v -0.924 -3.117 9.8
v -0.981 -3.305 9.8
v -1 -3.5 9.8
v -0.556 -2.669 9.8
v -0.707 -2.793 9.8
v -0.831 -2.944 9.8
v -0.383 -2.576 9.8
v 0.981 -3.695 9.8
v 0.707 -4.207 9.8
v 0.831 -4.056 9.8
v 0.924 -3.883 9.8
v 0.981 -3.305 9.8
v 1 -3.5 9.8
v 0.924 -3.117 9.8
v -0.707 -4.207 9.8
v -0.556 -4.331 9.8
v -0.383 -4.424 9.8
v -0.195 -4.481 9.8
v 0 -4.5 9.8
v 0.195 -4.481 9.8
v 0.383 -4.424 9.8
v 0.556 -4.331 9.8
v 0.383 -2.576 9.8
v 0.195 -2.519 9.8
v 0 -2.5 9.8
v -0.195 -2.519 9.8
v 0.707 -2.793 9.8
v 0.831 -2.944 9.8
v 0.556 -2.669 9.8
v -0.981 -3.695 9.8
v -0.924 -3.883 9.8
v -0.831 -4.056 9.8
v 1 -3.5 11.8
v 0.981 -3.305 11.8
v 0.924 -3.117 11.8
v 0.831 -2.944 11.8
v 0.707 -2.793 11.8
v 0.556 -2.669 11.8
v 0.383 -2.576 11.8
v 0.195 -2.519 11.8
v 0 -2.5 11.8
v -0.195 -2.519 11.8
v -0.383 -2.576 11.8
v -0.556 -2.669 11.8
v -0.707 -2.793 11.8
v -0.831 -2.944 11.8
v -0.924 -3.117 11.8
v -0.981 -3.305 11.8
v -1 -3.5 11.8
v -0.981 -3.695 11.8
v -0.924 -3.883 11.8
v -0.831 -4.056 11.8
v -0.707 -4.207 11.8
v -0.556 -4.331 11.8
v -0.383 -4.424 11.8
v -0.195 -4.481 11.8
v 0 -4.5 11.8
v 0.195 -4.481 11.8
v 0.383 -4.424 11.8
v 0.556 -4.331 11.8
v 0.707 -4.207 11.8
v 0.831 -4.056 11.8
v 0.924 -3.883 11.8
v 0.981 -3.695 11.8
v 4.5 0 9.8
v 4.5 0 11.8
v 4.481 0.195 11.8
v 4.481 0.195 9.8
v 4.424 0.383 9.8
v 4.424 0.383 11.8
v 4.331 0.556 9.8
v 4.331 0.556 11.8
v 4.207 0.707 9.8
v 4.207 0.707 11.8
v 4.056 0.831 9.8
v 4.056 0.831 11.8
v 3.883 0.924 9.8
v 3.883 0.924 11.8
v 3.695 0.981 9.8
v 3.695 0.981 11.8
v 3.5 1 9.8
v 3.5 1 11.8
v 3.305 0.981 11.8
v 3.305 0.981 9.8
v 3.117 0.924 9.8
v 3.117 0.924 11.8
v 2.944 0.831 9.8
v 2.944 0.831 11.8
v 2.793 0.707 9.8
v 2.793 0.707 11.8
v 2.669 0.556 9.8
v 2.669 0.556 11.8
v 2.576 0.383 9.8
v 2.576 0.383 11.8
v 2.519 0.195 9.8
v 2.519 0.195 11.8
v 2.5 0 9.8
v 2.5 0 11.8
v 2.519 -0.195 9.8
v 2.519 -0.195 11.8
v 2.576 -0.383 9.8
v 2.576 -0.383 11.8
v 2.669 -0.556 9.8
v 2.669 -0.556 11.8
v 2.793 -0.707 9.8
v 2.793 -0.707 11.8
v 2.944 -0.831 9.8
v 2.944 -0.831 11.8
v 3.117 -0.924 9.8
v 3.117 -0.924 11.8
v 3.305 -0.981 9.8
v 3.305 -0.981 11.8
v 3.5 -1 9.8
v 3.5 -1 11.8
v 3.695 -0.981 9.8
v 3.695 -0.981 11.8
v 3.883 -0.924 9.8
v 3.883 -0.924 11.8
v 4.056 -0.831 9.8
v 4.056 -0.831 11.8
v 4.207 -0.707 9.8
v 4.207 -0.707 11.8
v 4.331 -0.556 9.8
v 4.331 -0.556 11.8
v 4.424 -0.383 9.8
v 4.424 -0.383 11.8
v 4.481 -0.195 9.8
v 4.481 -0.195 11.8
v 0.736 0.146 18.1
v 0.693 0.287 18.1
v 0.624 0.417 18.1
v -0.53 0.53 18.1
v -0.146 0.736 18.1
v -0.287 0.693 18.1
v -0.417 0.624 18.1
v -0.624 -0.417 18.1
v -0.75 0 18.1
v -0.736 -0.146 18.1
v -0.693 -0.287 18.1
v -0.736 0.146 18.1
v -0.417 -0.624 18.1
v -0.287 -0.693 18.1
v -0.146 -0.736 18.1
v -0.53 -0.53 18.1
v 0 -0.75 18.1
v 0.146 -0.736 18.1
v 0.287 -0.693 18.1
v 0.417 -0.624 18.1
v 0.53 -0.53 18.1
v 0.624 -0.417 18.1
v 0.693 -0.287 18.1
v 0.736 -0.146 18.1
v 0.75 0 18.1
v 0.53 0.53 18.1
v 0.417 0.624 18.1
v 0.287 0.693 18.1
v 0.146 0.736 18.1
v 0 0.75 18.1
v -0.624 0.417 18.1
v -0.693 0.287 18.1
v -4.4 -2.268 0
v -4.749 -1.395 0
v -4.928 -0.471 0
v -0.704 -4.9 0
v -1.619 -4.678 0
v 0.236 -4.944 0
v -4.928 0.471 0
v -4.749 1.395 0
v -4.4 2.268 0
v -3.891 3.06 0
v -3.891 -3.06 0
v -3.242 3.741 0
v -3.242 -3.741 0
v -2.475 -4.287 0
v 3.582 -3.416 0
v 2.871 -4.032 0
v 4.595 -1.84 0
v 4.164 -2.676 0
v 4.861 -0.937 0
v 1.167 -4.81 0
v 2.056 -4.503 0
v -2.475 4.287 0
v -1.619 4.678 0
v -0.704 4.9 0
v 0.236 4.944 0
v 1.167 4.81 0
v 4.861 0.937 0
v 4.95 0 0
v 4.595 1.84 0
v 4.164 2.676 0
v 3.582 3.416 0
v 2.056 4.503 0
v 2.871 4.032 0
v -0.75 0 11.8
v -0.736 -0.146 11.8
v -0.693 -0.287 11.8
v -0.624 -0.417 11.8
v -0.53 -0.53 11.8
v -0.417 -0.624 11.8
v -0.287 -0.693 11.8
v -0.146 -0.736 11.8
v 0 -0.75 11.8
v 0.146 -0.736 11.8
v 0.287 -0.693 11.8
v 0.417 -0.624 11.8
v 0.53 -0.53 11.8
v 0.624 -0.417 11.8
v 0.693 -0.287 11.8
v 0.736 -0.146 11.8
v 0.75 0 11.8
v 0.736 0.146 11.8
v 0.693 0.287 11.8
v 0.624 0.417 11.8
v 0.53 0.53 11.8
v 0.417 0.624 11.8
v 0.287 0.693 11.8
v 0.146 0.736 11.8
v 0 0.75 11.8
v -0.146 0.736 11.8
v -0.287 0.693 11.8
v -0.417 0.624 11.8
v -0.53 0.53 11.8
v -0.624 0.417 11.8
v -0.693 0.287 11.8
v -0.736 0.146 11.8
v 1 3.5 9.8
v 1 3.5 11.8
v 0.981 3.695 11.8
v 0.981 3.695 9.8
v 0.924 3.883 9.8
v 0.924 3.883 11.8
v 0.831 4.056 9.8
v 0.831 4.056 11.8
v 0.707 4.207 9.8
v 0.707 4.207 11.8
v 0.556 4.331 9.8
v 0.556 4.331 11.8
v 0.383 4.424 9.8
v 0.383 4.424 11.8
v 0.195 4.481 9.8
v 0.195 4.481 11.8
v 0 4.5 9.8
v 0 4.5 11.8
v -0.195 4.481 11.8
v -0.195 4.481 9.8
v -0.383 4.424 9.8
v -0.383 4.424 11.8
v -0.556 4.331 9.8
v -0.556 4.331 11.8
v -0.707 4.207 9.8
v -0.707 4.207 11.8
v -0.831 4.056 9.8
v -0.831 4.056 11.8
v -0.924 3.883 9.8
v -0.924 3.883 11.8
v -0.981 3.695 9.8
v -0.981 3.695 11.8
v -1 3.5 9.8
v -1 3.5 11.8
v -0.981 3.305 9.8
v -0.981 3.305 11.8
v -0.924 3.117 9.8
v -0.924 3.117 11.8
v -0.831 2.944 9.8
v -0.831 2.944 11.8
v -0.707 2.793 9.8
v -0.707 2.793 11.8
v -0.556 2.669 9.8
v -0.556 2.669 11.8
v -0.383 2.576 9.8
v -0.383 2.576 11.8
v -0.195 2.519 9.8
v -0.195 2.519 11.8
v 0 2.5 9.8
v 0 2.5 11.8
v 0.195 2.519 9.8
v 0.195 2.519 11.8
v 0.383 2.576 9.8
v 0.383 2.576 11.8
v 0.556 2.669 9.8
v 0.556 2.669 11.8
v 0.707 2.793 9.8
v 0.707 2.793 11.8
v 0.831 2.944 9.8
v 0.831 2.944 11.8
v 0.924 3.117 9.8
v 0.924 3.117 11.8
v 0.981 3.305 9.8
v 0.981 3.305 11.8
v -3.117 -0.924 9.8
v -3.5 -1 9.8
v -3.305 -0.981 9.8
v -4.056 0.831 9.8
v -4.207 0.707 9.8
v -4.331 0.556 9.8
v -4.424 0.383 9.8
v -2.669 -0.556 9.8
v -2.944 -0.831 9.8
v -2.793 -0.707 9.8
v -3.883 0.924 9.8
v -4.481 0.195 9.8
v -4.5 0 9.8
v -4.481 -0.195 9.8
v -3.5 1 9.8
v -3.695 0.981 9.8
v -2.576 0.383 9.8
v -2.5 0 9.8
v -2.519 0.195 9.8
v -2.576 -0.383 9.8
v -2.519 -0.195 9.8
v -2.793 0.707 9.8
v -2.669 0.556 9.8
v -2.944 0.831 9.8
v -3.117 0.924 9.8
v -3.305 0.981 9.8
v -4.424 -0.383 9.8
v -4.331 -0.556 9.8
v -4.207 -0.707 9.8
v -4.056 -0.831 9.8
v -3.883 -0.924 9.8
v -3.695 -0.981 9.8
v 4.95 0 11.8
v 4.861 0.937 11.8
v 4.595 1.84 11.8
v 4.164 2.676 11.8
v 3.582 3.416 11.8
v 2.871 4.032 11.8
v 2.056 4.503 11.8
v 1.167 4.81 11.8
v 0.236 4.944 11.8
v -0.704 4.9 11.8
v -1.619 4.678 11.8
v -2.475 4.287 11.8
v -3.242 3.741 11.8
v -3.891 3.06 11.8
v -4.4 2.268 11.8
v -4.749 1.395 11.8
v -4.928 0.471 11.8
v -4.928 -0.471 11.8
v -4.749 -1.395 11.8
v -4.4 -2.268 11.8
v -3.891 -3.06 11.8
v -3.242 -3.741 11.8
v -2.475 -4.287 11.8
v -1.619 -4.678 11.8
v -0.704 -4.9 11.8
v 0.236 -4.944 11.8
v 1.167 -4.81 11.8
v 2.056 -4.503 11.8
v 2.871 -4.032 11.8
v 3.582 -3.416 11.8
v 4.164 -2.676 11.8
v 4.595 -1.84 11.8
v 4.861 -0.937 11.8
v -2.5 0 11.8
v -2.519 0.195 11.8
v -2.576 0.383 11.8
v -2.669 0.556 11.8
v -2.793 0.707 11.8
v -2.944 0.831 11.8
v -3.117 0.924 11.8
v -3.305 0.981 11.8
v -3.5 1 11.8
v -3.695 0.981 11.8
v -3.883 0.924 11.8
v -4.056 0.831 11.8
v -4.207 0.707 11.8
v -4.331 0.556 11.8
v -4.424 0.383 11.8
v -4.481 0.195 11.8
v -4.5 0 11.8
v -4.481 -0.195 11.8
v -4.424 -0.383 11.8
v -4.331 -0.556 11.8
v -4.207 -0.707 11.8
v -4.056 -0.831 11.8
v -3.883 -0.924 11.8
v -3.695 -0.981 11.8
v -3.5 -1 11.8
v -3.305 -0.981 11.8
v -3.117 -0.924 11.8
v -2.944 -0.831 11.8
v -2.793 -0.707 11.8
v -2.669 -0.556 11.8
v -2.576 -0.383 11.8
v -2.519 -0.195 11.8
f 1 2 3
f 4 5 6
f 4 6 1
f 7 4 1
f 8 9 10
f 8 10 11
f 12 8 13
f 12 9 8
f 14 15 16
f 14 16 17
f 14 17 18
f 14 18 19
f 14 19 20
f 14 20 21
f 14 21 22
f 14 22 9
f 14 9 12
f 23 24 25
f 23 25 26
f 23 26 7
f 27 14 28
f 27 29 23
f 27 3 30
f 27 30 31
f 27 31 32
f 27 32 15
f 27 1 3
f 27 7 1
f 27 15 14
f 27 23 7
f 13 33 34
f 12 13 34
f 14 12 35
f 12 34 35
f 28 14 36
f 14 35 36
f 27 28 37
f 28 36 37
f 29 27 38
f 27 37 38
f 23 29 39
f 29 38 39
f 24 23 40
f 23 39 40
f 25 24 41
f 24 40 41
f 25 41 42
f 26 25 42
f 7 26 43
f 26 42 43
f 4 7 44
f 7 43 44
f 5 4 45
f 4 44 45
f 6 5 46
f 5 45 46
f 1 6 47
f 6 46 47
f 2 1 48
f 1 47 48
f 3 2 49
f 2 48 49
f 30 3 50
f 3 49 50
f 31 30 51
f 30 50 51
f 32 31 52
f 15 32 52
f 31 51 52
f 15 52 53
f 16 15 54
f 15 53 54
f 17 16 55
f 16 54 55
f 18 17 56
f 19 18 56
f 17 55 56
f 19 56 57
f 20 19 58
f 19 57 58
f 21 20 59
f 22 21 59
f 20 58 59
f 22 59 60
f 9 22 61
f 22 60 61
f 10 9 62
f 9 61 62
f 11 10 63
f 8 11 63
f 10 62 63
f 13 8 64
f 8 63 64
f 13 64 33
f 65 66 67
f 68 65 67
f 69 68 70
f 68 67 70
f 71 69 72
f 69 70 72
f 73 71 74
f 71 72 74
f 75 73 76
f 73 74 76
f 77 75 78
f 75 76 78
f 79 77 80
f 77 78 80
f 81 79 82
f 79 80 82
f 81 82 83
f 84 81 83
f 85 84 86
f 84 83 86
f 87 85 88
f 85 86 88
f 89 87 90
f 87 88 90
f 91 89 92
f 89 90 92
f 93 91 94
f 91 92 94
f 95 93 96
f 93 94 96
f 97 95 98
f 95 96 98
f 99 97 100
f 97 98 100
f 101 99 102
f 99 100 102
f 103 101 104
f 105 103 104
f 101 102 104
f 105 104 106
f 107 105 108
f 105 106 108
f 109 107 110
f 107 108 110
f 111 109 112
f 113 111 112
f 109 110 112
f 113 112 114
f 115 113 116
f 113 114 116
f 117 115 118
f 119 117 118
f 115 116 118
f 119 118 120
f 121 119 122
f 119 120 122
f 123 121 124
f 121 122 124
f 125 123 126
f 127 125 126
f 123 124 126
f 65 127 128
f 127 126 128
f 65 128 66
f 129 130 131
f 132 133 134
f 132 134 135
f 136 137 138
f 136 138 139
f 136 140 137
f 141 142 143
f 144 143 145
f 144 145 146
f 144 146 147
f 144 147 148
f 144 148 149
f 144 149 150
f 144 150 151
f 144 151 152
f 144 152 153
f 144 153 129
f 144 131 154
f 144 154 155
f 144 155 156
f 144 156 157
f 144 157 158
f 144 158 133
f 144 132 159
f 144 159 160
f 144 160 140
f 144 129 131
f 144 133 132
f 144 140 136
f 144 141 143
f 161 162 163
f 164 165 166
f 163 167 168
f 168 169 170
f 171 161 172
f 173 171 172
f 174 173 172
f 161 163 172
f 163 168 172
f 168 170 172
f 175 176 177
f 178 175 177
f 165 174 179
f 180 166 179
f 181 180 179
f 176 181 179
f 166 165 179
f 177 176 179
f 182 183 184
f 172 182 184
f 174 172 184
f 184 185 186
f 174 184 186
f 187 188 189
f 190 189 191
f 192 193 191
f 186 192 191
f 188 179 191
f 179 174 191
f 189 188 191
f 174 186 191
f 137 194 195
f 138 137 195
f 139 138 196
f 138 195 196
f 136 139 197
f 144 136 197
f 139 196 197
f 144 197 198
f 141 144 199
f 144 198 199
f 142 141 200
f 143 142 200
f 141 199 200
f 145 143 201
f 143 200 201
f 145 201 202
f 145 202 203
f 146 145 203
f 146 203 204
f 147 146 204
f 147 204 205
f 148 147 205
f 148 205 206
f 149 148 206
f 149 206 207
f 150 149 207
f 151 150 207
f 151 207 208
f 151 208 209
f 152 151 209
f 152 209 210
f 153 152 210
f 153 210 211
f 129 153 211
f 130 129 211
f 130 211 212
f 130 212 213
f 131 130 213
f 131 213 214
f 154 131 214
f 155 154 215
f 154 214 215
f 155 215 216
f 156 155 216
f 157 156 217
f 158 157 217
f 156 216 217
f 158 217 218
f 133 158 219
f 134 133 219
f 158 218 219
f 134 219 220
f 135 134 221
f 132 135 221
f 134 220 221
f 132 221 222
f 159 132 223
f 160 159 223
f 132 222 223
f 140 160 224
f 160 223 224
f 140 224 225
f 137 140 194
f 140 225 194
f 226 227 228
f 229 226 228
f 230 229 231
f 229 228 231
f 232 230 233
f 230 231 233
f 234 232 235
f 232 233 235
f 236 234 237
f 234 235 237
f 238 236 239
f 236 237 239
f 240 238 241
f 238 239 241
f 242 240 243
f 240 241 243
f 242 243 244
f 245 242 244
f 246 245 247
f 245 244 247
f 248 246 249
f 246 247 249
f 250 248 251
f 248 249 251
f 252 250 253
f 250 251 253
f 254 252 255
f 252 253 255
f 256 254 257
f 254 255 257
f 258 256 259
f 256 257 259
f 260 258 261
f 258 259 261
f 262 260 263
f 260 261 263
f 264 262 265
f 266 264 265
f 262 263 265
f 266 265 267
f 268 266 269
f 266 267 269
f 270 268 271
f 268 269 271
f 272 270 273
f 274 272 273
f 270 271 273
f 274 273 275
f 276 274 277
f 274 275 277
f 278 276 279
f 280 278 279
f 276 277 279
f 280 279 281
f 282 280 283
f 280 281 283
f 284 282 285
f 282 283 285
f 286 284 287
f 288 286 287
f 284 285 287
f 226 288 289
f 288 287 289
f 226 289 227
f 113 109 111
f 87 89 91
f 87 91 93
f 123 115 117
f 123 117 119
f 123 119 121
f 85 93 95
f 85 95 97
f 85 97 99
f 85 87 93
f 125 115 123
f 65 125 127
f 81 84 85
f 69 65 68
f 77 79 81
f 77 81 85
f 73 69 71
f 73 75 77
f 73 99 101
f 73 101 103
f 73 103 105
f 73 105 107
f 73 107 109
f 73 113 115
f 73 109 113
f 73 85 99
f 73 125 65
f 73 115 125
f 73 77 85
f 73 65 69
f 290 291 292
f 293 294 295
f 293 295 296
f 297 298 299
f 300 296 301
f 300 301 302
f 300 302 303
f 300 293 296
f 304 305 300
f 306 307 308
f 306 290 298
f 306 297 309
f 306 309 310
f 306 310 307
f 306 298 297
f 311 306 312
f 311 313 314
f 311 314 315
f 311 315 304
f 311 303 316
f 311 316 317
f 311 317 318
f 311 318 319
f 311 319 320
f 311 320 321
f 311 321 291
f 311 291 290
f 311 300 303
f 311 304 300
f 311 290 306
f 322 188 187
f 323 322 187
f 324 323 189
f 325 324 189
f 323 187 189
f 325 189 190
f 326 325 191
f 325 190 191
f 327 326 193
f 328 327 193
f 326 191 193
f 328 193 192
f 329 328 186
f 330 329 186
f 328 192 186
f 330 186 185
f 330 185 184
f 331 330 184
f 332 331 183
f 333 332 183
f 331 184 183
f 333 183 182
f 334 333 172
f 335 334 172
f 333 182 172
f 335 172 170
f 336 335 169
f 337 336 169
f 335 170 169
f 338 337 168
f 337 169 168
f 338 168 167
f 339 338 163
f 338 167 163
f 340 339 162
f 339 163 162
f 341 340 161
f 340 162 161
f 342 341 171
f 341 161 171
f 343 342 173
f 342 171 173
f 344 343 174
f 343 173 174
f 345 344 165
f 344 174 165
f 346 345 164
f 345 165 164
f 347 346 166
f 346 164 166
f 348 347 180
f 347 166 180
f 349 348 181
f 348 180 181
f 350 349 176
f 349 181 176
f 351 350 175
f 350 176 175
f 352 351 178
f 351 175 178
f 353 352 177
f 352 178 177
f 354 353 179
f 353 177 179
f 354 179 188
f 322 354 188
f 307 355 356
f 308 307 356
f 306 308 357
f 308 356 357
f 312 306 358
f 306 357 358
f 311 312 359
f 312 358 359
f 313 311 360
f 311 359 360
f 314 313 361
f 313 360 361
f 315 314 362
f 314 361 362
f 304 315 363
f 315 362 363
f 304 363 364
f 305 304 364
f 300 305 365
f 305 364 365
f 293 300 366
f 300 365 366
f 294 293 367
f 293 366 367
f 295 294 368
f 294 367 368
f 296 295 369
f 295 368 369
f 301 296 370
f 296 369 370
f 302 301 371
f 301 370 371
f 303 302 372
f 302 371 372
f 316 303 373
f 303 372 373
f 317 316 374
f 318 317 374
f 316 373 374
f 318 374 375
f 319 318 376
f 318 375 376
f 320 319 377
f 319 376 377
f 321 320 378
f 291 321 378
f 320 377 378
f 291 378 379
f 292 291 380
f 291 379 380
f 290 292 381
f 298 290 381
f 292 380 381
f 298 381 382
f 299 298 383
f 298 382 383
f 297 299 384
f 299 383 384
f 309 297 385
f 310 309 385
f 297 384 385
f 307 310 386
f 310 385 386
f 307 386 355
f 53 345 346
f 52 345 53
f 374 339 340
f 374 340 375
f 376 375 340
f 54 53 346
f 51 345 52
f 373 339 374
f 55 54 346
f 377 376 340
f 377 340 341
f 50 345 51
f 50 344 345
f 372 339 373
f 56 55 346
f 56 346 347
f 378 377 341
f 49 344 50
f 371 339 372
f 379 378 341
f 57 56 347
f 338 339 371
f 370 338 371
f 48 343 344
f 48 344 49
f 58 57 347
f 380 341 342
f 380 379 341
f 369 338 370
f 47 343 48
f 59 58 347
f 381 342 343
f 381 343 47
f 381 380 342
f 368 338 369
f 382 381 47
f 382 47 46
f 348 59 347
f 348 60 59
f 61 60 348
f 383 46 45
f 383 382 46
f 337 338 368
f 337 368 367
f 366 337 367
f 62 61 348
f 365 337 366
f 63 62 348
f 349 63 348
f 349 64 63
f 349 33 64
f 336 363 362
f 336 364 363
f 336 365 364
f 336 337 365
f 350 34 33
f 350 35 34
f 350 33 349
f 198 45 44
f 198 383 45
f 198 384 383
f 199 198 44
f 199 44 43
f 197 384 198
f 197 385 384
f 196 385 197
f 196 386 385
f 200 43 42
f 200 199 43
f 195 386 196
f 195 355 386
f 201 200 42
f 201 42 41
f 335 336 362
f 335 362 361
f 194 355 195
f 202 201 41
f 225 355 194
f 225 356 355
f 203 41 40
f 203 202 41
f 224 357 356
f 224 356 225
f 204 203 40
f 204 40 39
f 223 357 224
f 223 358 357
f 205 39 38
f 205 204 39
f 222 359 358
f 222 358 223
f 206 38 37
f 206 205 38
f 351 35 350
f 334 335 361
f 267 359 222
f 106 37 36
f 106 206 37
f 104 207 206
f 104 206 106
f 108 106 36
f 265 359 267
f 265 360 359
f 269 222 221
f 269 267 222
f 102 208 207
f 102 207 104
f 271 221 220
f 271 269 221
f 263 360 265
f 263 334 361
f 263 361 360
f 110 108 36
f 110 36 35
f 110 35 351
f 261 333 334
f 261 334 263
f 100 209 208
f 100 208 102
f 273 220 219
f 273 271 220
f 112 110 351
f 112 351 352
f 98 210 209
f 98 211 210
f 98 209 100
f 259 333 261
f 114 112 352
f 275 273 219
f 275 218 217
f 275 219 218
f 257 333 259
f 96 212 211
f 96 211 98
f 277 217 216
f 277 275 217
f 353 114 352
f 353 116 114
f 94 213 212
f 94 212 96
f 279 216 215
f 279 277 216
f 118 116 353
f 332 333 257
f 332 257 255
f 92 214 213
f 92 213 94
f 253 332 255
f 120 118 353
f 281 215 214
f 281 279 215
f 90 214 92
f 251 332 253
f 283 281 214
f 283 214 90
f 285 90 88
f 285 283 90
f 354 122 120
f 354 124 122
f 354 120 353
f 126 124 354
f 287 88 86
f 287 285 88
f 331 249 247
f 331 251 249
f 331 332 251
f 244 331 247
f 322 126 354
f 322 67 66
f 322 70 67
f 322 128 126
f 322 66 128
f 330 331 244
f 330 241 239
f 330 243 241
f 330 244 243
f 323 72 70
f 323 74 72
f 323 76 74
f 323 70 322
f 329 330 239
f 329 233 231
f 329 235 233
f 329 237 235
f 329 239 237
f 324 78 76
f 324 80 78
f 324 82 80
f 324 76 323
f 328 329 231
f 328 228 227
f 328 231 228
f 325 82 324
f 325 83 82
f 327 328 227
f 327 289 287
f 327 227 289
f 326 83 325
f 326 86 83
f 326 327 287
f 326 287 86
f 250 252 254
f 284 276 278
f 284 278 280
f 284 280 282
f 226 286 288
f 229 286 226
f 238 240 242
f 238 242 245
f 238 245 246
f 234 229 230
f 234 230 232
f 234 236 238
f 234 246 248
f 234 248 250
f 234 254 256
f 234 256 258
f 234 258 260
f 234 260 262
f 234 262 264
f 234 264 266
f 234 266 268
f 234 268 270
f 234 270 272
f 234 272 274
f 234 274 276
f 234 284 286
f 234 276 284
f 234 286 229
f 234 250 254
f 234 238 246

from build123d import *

# Parameters (mm, degrees)
SKETCH1_R           = 4.95
SKETCH1_R_2         = 1
SKETCH1_R_3         = 0.75
BOSS_EXTRUDE1_DEPTH = 11.8
SKETCH1_3_R         = 0.75
BOSS_EXTRUDE2_DEPTH = 18.1
CUT_EXTRUDE1_START  = 11.8
SKETCH1_5_R         = 1
CUT_EXTRUDE1_DEPTH  = 2


with BuildPart() as part:
    # Sketch1 → Boss-Extrude1 (new body)
    # profile 1 of 5: a face of its own
    with BuildSketch(Plane.XY):
        Circle(SKETCH1_R)
        with Locations((-3.5, 0)):
            Circle(SKETCH1_R_2, mode=Mode.SUBTRACT)
        with Locations((0, -3.5)):
            Circle(SKETCH1_R_2, mode=Mode.SUBTRACT)
        with Locations((3.5, 0)):
            Circle(SKETCH1_R_2, mode=Mode.SUBTRACT)
        with Locations((0, 3.5)):
            Circle(SKETCH1_R_2, mode=Mode.SUBTRACT)
        Circle(SKETCH1_R_3, mode=Mode.SUBTRACT)
    # profile 2 of 5: a face of its own
    with BuildSketch(Plane.XY):
        with Locations((-3.5, 0)):
            Circle(SKETCH1_R_2)
    # profile 3 of 5: a face of its own
    with BuildSketch(Plane.XY):
        with Locations((0, 3.5)):
            Circle(SKETCH1_R_2)
    # profile 4 of 5: a face of its own
    with BuildSketch(Plane.XY):
        with Locations((3.5, 0)):
            Circle(SKETCH1_R_2)
    # profile 5 of 5: a face of its own
    with BuildSketch(Plane.XY):
        with Locations((0, -3.5)):
            Circle(SKETCH1_R_2)
    extrude(amount=BOSS_EXTRUDE1_DEPTH)

    # Sketch1<3> → Boss-Extrude2 (add)
    with BuildSketch(Plane.XY):
        with Locations(Location((0, 0, 0), (0, 0, 180))):
            Circle(SKETCH1_3_R)
    extrude(amount=BOSS_EXTRUDE2_DEPTH)

    # Sketch1<5> → Cut-Extrude1 (cut)
    with BuildSketch(Plane.XY.offset(CUT_EXTRUDE1_START)):
        with Locations((0, 3.5)):
            Circle(SKETCH1_5_R)
        with Locations((-3.5, 0)):
            Circle(SKETCH1_5_R)
        with Locations((3.5, 0)):
            Circle(SKETCH1_5_R)
        with Locations((0, -3.5)):
            Circle(SKETCH1_5_R)
    extrude(amount=-CUT_EXTRUDE1_DEPTH, mode=Mode.SUBTRACT)


solid = part.part
